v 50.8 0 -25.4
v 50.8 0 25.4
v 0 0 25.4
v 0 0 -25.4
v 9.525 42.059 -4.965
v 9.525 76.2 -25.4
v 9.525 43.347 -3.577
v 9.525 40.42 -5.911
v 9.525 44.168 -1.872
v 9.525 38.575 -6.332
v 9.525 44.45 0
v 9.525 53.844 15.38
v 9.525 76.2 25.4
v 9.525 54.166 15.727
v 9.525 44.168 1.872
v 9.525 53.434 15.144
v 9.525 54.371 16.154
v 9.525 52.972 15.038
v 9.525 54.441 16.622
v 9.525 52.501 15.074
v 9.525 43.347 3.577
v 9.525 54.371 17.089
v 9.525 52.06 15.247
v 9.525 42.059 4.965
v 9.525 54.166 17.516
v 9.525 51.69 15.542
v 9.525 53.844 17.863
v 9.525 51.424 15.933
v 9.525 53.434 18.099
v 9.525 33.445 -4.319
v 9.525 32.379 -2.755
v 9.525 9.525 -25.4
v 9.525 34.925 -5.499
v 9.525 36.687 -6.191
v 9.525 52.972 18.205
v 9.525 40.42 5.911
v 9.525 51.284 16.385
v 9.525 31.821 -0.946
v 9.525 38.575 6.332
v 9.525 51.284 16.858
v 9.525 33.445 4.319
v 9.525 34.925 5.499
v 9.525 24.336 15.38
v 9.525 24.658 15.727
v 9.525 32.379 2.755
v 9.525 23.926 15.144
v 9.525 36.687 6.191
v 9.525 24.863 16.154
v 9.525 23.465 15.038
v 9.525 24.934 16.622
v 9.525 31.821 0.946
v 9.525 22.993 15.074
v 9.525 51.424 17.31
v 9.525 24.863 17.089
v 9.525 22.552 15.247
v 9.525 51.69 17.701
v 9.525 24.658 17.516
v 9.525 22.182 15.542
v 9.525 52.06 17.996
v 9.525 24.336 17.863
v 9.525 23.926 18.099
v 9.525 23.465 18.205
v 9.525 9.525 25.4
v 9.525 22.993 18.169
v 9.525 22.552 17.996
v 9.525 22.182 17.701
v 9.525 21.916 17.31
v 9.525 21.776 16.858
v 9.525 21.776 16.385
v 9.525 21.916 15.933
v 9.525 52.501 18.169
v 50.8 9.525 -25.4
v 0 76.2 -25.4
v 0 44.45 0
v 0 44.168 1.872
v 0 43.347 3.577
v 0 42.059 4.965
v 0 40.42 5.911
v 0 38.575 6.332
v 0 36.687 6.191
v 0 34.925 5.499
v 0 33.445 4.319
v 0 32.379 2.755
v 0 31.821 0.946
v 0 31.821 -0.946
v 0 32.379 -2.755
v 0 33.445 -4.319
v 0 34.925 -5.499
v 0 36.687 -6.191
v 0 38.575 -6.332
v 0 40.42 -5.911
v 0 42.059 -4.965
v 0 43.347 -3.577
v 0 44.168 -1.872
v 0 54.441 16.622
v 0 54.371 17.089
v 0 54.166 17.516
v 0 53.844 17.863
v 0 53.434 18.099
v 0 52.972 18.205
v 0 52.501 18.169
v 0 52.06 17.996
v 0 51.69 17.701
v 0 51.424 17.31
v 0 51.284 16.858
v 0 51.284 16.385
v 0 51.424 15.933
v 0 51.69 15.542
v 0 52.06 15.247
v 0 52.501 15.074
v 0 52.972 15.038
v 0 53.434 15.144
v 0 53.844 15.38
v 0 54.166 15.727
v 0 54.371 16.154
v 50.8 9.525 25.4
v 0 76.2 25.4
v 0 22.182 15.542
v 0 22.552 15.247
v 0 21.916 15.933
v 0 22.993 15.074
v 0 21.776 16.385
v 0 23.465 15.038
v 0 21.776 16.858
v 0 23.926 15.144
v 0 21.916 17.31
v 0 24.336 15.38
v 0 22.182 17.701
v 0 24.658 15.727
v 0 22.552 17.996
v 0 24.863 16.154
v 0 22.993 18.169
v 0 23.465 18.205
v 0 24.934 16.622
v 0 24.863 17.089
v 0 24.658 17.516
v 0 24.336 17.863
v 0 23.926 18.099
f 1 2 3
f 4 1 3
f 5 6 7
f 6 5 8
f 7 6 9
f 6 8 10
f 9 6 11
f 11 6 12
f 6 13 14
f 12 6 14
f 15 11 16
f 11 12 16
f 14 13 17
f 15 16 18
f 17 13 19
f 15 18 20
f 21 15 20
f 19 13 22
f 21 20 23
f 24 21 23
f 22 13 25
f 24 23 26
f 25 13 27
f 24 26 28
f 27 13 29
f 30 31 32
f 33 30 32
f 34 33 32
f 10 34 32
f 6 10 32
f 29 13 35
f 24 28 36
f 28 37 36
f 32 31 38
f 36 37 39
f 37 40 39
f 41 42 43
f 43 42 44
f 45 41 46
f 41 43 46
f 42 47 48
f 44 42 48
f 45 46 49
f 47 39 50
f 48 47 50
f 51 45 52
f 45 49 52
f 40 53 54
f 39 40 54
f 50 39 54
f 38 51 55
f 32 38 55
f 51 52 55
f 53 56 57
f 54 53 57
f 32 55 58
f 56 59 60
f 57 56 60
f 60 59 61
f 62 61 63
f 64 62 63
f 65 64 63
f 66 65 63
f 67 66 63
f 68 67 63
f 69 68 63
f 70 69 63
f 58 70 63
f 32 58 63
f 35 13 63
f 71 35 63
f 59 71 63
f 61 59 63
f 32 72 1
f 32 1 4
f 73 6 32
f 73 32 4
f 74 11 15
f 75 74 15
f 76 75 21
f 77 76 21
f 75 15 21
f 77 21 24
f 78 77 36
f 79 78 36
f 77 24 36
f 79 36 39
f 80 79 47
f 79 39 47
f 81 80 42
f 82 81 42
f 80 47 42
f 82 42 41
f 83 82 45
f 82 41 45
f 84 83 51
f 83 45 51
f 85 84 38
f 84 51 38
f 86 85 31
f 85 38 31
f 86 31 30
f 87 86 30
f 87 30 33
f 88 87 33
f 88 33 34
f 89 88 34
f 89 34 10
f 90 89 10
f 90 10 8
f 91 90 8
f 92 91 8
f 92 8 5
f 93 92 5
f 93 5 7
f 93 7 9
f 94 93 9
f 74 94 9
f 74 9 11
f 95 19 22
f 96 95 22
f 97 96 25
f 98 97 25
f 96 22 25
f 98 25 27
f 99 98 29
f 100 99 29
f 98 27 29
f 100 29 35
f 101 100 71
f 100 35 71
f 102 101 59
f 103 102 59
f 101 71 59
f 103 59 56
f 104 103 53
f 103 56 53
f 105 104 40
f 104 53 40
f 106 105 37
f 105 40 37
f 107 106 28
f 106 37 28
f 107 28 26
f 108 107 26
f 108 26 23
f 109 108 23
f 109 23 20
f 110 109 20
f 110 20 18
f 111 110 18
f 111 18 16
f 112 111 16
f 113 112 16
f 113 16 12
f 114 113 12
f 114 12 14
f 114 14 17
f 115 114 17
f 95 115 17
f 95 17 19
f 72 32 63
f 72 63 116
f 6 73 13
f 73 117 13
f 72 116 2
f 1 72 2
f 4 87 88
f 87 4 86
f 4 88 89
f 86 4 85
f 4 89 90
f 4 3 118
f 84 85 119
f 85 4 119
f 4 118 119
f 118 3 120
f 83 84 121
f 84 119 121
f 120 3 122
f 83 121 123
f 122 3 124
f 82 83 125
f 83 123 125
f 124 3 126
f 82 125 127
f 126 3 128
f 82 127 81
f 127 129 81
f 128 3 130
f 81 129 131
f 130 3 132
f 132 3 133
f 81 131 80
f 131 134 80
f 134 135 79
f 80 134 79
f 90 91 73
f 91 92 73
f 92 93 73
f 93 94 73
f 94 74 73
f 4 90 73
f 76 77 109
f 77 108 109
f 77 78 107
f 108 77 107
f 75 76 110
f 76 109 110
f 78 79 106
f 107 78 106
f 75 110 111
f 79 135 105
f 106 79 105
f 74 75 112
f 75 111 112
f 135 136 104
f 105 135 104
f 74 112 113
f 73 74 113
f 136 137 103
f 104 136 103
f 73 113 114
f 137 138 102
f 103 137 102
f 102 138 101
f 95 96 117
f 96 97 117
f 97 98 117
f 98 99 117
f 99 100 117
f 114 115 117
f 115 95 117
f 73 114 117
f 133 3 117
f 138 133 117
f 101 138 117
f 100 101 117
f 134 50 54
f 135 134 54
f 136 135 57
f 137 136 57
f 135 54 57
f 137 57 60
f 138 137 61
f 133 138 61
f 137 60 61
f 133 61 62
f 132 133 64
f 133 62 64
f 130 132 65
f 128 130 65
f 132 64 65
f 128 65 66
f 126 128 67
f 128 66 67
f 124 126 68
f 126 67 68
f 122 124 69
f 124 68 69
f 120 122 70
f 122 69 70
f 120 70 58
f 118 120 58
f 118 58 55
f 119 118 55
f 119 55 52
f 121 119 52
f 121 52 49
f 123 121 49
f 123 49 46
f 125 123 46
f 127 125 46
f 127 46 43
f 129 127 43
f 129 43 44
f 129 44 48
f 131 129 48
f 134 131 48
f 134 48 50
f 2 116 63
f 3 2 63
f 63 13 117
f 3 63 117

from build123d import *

# Parameters (mm, degrees)
BOSS_EXTRUDE1_DEPTH = 25.4
SKETCH3_R           = 6.35
CUT_EXTRUDE1_DEPTH  = 91.306287849
SKETCH4_R           = 1.5875
CUT_EXTRUDE2_DEPTH  = 91.306287849


with BuildPart() as part:
    # Sketch2 → Boss-Extrude1 (new, symmetric)
    with BuildSketch(Plane.XY):
        Polygon((0, 0), (0, 76.2), (9.525, 76.2), (9.525, 9.525), (50.8, 9.525), (50.8, 0), align=None)
    extrude(amount=BOSS_EXTRUDE1_DEPTH, both=True)

    # Sketch3 → Cut-Extrude1 (cut, through all)
    with BuildSketch(Plane(origin=(9.525, 0, 0), x_dir=(0, 0, -1), z_dir=(1, 0, 0))):
        with Locations(Location((0, 38.1, 0), (0, 0, 90))):
            Circle(SKETCH3_R)
    extrude(amount=-CUT_EXTRUDE1_DEPTH, mode=Mode.SUBTRACT)

    # Sketch4 → Cut-Extrude2 (cut, through all)
    with BuildSketch(Plane(origin=(9.525, 0, 0), x_dir=(0, 0, -1), z_dir=(1, 0, 0))):
        with Locations(Location((-16.621505447, 52.853853113, 0), (0, 0, 90))):
            Circle(SKETCH4_R)
        with Locations(Location((-16.621505447, 23.346146887, 0), (0, 0, 90))):
            Circle(SKETCH4_R)
    extrude(amount=-CUT_EXTRUDE2_DEPTH, mode=Mode.SUBTRACT)


solid = part.part
